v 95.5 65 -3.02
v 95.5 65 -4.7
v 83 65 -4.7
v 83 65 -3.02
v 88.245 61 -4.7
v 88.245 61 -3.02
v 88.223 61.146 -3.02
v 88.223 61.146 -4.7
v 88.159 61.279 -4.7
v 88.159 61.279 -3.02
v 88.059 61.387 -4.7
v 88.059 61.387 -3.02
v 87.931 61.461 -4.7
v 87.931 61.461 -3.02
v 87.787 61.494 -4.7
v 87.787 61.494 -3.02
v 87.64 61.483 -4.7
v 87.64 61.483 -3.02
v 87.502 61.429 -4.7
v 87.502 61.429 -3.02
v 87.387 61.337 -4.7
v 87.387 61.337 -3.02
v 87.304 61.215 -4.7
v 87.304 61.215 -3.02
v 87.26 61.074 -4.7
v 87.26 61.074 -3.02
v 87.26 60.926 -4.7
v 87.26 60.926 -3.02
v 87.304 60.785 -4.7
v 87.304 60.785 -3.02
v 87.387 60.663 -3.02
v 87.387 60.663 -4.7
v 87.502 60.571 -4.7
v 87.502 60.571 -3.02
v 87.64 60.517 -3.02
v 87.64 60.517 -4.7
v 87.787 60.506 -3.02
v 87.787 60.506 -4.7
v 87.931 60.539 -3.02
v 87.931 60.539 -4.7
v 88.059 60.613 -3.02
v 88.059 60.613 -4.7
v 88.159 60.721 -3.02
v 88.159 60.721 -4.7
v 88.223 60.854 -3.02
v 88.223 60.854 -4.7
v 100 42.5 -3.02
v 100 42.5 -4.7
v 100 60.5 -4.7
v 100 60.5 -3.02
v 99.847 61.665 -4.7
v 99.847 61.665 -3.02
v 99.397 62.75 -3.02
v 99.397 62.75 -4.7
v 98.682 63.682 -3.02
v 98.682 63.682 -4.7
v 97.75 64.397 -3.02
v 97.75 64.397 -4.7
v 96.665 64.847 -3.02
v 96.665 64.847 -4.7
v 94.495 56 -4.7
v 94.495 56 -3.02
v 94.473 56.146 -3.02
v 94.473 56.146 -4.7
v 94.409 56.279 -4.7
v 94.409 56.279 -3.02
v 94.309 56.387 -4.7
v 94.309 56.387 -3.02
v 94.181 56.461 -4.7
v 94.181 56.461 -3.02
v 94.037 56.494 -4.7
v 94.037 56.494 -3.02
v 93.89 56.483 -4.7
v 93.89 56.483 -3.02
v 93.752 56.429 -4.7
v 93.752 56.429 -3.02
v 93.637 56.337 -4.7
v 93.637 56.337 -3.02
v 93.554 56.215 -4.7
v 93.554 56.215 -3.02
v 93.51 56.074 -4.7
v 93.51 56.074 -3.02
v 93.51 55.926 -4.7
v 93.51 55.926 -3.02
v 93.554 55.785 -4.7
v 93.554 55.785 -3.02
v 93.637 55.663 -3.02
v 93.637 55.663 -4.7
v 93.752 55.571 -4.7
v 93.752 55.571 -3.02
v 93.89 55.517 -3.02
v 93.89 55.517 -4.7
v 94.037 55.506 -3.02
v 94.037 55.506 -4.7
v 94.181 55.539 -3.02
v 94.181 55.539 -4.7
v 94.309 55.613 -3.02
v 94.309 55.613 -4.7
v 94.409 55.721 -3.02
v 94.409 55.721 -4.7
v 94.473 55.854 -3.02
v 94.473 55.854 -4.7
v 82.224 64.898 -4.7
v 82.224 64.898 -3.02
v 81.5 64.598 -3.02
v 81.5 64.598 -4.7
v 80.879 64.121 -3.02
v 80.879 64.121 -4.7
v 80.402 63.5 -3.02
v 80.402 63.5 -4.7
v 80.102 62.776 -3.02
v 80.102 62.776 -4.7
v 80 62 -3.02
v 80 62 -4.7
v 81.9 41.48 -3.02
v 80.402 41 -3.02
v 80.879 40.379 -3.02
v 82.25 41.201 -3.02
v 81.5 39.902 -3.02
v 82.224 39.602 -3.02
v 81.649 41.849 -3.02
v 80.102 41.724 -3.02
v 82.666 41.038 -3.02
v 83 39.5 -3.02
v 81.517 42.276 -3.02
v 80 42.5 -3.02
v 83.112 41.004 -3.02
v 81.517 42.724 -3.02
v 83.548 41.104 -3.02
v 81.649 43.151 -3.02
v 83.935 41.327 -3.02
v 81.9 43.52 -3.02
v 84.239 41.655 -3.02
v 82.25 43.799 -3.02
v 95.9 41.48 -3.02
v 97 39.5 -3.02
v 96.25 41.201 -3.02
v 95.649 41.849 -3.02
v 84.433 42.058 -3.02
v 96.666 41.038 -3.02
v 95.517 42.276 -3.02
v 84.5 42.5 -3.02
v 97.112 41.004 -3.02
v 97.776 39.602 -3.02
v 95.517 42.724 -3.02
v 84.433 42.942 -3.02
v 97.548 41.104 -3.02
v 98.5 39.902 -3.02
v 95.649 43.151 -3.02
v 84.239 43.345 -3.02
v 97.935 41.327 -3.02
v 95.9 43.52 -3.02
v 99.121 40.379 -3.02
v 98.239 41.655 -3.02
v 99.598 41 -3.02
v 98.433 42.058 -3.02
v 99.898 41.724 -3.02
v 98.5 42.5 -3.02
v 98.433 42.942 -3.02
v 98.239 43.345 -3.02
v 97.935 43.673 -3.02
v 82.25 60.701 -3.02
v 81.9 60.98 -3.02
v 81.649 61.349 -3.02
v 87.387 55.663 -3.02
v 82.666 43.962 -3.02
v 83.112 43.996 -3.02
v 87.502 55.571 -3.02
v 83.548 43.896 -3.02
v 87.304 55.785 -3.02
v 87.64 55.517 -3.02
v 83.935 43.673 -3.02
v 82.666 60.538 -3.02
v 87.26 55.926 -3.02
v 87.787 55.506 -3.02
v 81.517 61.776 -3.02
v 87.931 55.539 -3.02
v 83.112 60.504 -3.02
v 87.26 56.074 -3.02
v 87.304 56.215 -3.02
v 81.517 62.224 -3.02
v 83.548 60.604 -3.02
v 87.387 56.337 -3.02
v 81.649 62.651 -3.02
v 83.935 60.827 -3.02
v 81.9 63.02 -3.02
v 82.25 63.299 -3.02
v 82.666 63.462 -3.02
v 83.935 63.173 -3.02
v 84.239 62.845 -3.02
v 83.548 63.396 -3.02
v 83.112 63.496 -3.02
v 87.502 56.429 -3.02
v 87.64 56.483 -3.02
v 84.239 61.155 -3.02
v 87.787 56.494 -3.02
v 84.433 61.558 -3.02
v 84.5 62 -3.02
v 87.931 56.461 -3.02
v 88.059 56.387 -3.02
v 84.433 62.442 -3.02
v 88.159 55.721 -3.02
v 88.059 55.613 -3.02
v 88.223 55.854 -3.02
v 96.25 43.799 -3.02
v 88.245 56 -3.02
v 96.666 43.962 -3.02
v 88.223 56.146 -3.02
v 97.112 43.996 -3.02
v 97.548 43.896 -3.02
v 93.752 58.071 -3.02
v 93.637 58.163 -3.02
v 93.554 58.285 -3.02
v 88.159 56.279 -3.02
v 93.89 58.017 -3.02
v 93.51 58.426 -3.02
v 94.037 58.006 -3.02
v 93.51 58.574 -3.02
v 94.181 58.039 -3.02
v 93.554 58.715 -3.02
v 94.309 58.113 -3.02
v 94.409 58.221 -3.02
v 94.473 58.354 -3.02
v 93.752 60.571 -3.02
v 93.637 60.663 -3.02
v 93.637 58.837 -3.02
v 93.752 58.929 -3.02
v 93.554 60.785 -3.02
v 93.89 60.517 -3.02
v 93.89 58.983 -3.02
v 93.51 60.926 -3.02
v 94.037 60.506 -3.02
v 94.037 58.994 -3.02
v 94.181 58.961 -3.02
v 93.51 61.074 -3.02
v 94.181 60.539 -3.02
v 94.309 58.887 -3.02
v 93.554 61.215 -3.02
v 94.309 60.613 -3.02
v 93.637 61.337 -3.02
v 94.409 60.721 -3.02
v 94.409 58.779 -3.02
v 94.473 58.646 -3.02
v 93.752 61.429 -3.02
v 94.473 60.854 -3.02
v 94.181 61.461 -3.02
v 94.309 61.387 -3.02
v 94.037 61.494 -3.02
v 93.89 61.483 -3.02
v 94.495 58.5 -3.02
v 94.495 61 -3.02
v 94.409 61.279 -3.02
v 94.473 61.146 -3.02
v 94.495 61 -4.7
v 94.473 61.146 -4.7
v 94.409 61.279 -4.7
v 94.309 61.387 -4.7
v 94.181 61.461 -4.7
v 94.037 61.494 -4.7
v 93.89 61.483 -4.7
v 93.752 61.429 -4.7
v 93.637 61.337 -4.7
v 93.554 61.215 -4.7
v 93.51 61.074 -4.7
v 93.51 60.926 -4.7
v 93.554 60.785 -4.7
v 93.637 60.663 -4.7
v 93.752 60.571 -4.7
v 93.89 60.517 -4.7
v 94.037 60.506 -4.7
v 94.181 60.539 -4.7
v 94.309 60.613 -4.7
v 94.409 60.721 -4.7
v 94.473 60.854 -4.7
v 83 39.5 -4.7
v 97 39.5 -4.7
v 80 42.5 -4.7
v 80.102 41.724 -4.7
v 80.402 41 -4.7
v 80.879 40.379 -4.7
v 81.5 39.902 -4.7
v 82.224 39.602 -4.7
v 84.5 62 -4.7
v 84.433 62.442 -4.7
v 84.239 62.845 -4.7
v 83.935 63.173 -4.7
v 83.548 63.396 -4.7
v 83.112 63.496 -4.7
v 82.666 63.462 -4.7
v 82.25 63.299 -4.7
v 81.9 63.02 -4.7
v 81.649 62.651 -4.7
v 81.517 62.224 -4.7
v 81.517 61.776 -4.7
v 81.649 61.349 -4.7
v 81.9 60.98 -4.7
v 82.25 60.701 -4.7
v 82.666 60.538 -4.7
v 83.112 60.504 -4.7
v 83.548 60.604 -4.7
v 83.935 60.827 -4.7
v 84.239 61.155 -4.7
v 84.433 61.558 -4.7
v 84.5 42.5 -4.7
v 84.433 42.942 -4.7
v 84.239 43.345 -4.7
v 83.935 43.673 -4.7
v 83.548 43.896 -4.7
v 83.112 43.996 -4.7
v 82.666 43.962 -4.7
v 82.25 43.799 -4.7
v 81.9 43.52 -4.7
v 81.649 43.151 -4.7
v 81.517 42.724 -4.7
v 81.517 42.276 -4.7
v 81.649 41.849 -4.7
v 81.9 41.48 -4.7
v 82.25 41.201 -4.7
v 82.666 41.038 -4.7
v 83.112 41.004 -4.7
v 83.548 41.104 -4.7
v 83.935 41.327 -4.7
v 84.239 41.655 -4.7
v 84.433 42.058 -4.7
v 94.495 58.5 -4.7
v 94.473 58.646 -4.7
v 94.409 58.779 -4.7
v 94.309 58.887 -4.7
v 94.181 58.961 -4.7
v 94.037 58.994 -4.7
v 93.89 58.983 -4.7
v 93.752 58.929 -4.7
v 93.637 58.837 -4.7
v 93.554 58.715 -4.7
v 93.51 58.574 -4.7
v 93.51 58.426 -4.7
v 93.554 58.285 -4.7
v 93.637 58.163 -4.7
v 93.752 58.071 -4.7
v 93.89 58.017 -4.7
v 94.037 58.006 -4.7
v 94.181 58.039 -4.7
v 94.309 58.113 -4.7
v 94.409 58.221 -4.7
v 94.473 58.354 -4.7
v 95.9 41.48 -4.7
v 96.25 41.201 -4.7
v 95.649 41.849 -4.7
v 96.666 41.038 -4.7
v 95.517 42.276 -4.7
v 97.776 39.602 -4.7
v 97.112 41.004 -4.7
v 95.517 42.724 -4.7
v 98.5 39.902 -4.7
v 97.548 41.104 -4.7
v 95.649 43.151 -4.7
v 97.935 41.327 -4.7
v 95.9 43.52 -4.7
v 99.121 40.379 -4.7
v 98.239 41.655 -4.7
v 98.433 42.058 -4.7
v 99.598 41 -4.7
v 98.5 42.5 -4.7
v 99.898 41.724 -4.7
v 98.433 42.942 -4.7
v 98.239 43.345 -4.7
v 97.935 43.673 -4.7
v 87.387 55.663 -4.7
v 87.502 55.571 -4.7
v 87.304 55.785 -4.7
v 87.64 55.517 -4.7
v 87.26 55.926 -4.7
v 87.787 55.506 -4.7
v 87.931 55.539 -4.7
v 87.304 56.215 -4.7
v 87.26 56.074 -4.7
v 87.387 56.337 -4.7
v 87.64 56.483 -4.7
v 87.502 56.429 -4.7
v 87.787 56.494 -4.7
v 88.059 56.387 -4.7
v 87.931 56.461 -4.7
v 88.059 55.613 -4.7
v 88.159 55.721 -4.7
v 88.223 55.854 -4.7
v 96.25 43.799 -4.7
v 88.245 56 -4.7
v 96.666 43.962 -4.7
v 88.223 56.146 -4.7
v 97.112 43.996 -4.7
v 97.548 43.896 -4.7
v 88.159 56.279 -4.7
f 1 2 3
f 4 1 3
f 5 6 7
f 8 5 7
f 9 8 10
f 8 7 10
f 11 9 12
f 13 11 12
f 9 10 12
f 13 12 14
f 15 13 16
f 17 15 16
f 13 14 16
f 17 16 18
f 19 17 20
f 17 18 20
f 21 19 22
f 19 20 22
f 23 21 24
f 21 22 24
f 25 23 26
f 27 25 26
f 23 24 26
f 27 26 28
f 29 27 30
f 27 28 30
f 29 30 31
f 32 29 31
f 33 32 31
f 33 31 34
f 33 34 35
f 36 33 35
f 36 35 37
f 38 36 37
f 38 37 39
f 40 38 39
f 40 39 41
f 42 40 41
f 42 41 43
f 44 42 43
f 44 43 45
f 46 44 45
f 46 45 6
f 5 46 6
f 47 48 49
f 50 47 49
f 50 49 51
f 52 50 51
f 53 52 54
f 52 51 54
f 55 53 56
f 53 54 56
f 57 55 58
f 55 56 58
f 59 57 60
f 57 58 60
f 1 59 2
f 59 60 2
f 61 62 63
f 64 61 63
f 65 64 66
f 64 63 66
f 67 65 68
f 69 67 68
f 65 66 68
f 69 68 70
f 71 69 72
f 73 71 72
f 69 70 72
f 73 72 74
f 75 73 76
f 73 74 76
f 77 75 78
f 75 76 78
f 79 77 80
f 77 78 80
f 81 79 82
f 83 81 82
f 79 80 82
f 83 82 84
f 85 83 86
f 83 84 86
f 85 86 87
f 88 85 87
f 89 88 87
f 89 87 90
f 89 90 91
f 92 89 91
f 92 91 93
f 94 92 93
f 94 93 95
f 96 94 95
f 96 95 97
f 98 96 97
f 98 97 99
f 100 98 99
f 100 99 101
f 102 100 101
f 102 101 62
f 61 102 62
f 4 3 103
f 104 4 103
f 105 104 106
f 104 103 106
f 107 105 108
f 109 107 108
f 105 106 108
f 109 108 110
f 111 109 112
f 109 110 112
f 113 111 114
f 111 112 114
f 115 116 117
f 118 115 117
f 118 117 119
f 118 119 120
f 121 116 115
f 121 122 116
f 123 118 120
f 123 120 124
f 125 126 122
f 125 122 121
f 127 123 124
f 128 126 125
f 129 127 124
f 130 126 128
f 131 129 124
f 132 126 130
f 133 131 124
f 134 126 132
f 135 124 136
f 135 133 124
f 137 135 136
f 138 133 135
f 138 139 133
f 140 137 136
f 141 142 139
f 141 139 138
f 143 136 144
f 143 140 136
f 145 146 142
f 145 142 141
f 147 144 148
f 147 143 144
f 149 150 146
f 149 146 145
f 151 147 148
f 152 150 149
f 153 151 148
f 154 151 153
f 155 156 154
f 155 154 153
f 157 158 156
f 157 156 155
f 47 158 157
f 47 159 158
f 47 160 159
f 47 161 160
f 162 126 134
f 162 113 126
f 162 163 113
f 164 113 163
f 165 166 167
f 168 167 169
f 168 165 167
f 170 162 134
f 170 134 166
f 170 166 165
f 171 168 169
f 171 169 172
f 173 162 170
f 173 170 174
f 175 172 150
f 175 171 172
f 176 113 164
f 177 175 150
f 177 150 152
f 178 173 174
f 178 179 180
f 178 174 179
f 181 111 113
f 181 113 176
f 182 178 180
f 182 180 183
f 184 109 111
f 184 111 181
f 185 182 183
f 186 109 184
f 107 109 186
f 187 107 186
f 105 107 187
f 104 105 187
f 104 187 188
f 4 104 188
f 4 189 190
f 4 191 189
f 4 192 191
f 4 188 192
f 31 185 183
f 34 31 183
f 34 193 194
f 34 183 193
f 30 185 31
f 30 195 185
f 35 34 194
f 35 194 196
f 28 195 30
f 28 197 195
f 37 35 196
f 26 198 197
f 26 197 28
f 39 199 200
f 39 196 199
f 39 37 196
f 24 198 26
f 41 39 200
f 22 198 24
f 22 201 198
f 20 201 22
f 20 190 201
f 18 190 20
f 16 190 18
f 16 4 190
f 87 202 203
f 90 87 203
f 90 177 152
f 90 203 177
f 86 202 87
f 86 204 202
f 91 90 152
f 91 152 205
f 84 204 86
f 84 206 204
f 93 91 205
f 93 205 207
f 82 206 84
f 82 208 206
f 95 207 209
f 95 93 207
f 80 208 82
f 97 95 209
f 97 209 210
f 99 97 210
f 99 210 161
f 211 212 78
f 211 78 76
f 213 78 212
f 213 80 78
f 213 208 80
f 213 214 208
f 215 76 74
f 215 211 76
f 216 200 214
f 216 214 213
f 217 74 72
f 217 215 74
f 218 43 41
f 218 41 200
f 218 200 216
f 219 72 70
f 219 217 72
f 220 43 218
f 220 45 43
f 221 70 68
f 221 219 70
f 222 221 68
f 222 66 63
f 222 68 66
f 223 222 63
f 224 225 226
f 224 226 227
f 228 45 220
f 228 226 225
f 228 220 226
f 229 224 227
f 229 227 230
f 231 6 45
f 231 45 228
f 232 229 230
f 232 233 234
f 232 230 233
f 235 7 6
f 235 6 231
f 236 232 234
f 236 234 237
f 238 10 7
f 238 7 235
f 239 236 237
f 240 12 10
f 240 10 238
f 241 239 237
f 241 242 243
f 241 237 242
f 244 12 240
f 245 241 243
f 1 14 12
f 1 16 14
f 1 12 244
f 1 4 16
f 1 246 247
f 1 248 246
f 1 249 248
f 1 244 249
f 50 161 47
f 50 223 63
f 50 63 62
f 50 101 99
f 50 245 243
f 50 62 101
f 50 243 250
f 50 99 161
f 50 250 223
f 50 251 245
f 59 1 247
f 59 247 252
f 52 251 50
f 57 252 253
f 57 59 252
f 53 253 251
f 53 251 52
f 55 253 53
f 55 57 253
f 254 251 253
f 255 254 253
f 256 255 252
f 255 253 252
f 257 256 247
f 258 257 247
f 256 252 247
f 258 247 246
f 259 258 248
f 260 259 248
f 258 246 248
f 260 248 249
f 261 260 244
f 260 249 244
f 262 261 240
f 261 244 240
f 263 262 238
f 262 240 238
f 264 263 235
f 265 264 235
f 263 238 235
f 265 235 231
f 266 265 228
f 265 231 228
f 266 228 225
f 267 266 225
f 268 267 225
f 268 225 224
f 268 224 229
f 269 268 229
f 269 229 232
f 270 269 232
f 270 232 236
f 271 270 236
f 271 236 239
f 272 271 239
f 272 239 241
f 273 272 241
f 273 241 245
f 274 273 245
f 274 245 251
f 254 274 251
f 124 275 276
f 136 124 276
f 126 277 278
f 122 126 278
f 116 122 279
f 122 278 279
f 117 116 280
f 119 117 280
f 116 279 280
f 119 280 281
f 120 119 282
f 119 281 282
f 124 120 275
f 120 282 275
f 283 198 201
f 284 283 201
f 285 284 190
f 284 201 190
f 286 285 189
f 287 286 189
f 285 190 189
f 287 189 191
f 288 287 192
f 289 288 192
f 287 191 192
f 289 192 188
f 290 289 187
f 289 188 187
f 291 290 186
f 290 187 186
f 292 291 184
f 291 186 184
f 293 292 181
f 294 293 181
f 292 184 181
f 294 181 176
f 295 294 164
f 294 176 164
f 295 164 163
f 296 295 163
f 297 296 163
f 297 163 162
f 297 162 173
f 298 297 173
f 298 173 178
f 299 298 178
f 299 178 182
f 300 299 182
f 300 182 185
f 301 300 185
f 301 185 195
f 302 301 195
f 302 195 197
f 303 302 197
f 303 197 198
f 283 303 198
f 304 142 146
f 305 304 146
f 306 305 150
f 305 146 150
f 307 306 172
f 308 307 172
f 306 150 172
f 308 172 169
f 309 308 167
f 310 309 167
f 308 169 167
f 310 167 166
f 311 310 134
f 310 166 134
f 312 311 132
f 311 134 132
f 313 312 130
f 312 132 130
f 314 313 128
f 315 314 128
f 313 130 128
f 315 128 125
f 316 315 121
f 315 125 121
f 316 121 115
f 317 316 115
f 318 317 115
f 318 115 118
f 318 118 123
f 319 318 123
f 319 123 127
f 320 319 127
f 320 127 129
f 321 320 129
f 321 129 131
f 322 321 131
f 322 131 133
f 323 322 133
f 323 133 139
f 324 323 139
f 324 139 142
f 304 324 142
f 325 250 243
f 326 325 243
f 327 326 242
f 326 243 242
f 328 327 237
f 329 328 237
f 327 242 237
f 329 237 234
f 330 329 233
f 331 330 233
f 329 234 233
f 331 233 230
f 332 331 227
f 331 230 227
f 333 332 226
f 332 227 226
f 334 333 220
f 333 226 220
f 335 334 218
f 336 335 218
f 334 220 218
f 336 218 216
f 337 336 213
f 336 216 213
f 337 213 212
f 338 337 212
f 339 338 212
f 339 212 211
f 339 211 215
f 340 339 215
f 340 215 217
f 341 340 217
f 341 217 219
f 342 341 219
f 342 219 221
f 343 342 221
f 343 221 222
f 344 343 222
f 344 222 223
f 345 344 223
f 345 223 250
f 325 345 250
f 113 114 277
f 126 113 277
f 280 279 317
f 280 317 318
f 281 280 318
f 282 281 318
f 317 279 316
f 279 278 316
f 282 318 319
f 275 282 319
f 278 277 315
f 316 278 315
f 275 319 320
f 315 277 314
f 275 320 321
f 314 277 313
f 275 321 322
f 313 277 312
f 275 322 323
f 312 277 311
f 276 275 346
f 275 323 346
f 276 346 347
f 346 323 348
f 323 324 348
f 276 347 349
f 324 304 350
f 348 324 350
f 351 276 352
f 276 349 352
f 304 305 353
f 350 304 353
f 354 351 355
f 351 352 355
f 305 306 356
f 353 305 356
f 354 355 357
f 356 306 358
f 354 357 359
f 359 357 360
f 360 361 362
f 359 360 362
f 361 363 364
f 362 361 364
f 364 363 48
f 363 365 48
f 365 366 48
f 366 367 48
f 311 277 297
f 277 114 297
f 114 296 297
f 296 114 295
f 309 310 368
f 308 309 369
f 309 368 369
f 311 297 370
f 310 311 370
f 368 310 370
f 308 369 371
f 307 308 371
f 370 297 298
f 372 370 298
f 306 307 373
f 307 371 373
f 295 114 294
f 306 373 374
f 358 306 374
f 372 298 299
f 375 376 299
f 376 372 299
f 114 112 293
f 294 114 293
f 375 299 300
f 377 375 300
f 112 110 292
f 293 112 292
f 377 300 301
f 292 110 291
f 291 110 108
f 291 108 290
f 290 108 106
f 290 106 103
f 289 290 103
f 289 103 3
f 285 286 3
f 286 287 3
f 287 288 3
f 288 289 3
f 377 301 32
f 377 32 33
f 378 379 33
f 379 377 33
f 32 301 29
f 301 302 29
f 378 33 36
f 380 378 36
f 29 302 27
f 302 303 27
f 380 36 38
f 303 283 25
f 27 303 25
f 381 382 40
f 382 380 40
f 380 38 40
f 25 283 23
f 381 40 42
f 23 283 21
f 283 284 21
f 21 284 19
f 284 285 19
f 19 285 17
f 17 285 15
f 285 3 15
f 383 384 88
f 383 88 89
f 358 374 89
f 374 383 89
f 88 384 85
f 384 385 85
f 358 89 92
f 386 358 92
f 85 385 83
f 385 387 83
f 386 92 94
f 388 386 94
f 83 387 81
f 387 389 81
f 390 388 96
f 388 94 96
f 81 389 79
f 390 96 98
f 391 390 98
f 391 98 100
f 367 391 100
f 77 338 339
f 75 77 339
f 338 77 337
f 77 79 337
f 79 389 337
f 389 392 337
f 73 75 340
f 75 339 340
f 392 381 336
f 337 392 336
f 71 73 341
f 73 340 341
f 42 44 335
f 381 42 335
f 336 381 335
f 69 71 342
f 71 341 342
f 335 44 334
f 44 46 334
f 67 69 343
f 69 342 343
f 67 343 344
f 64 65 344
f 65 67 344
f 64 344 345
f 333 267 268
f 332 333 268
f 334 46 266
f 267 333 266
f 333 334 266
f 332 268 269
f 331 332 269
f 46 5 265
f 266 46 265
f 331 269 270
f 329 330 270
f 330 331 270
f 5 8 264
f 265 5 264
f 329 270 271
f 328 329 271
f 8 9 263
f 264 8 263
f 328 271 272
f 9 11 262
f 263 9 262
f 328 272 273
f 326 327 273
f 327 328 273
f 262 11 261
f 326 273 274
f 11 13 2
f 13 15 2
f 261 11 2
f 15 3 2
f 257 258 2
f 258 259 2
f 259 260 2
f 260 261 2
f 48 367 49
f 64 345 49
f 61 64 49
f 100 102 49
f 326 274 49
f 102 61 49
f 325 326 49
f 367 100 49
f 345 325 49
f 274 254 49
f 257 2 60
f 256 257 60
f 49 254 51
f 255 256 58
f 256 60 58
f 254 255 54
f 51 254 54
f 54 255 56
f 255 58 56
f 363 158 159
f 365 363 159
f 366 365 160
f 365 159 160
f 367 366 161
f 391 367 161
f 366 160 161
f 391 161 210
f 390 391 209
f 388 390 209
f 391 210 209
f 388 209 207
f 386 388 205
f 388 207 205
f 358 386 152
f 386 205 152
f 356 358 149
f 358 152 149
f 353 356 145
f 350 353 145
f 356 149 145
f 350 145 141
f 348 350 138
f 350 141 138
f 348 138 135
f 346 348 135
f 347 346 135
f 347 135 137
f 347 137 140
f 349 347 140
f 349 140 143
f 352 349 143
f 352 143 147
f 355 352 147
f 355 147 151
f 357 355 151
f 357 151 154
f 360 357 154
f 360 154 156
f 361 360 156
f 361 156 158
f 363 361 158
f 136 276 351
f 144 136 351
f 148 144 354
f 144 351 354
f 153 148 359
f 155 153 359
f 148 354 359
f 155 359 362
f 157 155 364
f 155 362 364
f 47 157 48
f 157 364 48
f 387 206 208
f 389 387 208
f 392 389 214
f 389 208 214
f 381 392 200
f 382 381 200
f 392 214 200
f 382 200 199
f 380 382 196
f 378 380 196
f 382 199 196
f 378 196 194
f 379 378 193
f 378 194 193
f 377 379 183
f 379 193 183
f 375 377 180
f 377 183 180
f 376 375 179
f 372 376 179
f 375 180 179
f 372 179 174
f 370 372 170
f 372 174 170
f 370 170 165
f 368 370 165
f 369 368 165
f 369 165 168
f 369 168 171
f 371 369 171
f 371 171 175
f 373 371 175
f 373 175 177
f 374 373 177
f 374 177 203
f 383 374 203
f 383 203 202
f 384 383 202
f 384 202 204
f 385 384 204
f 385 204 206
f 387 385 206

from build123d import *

# Parameters (mm, degrees)
BOARD_DEPTH        = 1.68
SKETCH2_R          = 1.5
SKETCH2_R_2        = 0.4953
PLATED_HOLES_DEPTH = 5.7


with BuildPart() as part:
    # Sketch1 → BOARD (new body)
    with BuildSketch(Plane.XY.offset(-4.7)):
        with BuildLine():
            Line((100, 42.5), (100, 60.5))
            ThreePointArc((100, 60.5), (98.681980515, 63.681980515), (95.5, 65))
            Line((95.5, 65), (83, 65))
            ThreePointArc((83, 65), (80.878679656, 64.121320344), (80, 62))
            Line((80, 62), (80, 42.5))
            ThreePointArc((80, 42.5), (80.878679656, 40.378679656), (83, 39.5))
            Line((83, 39.5), (97, 39.5))
            ThreePointArc((97, 39.5), (99.121320344, 40.378679656), (100, 42.5))
        make_face()
    extrude(amount=BOARD_DEPTH)

    # Sketch2 → PLATED HOLES (cut, through all)
    with BuildSketch(Plane.XY):
        with Locations((83, 42.5)):
            Circle(SKETCH2_R)
        with Locations((97, 42.5)):
            Circle(SKETCH2_R)
        with Locations((97, 35.5)):
            Circle(SKETCH2_R)
        with Locations((83, 62)):
            Circle(SKETCH2_R)
        with Locations((87.749999989, 55.999999989)):
            Circle(SKETCH2_R_2)
        with Locations((87.749999989, 60.999999996)):
            Circle(SKETCH2_R_2)
        with Locations((94.000000011, 58.499999992)):
            Circle(SKETCH2_R_2)
        with Locations((94.000000011, 55.999999989)):
            Circle(SKETCH2_R_2)
        with Locations((94.000000011, 60.999999996)):
            Circle(SKETCH2_R_2)
    extrude(amount=-PLATED_HOLES_DEPTH, mode=Mode.SUBTRACT)


solid = part.part
